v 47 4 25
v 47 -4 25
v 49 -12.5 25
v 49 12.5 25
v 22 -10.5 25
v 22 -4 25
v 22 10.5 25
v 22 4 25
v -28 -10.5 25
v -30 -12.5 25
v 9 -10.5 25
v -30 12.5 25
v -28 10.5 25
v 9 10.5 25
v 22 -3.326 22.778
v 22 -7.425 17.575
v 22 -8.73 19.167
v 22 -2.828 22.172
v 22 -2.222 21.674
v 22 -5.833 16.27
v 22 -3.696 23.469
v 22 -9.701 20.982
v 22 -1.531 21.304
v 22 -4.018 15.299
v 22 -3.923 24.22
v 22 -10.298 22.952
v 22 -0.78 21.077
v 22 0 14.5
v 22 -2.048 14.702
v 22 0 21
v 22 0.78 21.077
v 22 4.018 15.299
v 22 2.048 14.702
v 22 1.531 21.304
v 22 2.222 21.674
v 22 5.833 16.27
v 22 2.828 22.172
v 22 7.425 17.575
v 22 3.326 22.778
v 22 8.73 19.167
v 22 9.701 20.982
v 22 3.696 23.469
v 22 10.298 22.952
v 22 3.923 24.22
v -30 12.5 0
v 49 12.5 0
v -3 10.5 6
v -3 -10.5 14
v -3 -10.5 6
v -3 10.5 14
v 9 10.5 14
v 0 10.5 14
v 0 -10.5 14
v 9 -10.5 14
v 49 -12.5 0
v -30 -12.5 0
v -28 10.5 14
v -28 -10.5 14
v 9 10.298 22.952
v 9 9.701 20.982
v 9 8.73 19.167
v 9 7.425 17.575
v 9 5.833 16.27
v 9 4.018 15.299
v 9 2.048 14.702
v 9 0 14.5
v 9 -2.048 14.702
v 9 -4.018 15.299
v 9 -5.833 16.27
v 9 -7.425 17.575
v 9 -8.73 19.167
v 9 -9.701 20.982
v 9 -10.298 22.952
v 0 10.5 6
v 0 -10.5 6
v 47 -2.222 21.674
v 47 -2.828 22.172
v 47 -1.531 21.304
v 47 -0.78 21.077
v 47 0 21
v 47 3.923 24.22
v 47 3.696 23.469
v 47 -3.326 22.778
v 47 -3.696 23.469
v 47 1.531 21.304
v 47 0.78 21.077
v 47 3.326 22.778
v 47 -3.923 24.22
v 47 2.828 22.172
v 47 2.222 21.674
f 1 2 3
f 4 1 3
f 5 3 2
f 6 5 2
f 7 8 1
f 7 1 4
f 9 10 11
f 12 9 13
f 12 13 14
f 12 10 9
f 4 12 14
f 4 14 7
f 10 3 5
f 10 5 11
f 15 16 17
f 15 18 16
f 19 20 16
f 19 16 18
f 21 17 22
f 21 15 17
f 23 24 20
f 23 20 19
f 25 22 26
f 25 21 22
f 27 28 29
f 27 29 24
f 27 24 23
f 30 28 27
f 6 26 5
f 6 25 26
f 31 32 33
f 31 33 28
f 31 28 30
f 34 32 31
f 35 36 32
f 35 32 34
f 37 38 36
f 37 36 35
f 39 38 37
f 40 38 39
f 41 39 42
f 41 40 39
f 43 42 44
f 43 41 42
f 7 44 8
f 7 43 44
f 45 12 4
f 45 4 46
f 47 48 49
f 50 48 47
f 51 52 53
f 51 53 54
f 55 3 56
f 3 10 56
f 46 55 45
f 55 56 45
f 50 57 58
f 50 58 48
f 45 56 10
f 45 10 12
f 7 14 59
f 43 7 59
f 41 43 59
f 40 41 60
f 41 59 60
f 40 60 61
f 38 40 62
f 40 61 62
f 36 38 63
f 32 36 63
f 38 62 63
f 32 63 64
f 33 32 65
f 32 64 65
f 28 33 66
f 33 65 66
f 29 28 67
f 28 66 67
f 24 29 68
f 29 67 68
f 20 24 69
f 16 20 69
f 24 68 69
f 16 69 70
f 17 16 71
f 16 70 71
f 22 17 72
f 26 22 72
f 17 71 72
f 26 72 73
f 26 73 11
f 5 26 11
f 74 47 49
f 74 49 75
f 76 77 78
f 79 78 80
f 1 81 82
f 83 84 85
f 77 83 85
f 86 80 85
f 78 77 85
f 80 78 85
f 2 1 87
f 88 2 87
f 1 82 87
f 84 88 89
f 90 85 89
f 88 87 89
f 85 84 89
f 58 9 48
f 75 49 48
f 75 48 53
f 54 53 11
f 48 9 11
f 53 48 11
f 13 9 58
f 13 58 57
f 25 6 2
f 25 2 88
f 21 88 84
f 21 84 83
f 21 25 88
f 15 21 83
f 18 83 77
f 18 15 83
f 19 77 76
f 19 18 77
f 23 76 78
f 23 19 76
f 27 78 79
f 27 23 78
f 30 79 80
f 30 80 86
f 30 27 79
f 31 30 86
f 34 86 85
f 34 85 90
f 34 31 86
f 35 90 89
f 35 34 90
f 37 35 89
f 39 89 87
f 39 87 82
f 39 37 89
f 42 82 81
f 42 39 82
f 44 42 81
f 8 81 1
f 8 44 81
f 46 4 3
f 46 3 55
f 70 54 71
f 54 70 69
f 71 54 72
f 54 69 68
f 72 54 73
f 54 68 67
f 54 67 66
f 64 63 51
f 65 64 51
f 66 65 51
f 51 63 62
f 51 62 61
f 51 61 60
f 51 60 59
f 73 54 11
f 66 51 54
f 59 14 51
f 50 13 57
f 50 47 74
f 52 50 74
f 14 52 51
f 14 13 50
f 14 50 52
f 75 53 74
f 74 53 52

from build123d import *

# Parameters (mm, degrees)
SKETCH1_W           = 50
SKETCH1_H           = 25
BOSS_EXTRUDE1_DEPTH = 25
SKETCH2_W           = 37
SKETCH2_H           = 21
CUT_EXTRUDE1_DEPTH  = 11
SKETCH3_W           = 3
SKETCH3_H           = 21
CUT_EXTRUDE2_DEPTH  = 8
SKETCH7_W           = 25
SKETCH7_H           = 25
BOSS_EXTRUDE2_DEPTH = 19
CUT_EXTRUDE3_DEPTH  = 13
SKETCH10_W          = 25
SKETCH10_H          = 25
BOSS_EXTRUDE3_DEPTH = 10
CUT_EXTRUDE5_DEPTH  = 25


with BuildPart() as part:
    # Sketch1 → Boss-Extrude1 (new body)
    with BuildSketch(Plane.XY):
        with Locations((-5, 0)):
            Rectangle(SKETCH1_W, SKETCH1_H)
    extrude(amount=BOSS_EXTRUDE1_DEPTH)

    # Sketch2 → Cut-Extrude1 (cut)
    with BuildSketch(Plane.XY.offset(25)):
        with Locations((-9.5, 0)):
            Rectangle(SKETCH2_W, SKETCH2_H)
    extrude(amount=-CUT_EXTRUDE1_DEPTH, mode=Mode.SUBTRACT)

    # Sketch3 → Cut-Extrude2 (cut)
    with BuildSketch(Plane.XY.offset(14)):
        with Locations((-1.5, 0)):
            Rectangle(SKETCH3_W, SKETCH3_H)
    extrude(amount=-CUT_EXTRUDE2_DEPTH, mode=Mode.SUBTRACT)

    # Sketch7 → Boss-Extrude2 (add)
    with BuildSketch(Plane(origin=(20, 0, 0), x_dir=(0, 0, -1), z_dir=(1, 0, 0))):
        with Locations((-12.5, 0)):
            Rectangle(SKETCH7_W, SKETCH7_H)
    extrude(amount=BOSS_EXTRUDE2_DEPTH)

    # Sketch8 → Cut-Extrude3 (cut)
    with BuildSketch(Plane.ZY.offset(-9)):
        with BuildLine():
            Line((25, -10.5), (25, 10.5))
            ThreePointArc((25, 10.5), (14.5, 0), (25, -10.5))
        make_face()
    extrude(amount=-CUT_EXTRUDE3_DEPTH, mode=Mode.SUBTRACT)

    # Sketch10 → Boss-Extrude3 (add)
    with BuildSketch(Plane(origin=(39, 0, 0), x_dir=(0, 0, -1), z_dir=(1, 0, 0))):
        with Locations((-12.5, 0)):
            Rectangle(SKETCH10_W, SKETCH10_H)
    extrude(amount=BOSS_EXTRUDE3_DEPTH)

    # Sketch9 → Cut-Extrude5 (cut)
    with BuildSketch(Plane.ZY.offset(-22)):
        with BuildLine():
            Line((25, 4), (25, -4))
            ThreePointArc((25, -4), (21, 0), (25, 4))
        make_face()
    extrude(amount=-CUT_EXTRUDE5_DEPTH, mode=Mode.SUBTRACT)


solid = part.part
